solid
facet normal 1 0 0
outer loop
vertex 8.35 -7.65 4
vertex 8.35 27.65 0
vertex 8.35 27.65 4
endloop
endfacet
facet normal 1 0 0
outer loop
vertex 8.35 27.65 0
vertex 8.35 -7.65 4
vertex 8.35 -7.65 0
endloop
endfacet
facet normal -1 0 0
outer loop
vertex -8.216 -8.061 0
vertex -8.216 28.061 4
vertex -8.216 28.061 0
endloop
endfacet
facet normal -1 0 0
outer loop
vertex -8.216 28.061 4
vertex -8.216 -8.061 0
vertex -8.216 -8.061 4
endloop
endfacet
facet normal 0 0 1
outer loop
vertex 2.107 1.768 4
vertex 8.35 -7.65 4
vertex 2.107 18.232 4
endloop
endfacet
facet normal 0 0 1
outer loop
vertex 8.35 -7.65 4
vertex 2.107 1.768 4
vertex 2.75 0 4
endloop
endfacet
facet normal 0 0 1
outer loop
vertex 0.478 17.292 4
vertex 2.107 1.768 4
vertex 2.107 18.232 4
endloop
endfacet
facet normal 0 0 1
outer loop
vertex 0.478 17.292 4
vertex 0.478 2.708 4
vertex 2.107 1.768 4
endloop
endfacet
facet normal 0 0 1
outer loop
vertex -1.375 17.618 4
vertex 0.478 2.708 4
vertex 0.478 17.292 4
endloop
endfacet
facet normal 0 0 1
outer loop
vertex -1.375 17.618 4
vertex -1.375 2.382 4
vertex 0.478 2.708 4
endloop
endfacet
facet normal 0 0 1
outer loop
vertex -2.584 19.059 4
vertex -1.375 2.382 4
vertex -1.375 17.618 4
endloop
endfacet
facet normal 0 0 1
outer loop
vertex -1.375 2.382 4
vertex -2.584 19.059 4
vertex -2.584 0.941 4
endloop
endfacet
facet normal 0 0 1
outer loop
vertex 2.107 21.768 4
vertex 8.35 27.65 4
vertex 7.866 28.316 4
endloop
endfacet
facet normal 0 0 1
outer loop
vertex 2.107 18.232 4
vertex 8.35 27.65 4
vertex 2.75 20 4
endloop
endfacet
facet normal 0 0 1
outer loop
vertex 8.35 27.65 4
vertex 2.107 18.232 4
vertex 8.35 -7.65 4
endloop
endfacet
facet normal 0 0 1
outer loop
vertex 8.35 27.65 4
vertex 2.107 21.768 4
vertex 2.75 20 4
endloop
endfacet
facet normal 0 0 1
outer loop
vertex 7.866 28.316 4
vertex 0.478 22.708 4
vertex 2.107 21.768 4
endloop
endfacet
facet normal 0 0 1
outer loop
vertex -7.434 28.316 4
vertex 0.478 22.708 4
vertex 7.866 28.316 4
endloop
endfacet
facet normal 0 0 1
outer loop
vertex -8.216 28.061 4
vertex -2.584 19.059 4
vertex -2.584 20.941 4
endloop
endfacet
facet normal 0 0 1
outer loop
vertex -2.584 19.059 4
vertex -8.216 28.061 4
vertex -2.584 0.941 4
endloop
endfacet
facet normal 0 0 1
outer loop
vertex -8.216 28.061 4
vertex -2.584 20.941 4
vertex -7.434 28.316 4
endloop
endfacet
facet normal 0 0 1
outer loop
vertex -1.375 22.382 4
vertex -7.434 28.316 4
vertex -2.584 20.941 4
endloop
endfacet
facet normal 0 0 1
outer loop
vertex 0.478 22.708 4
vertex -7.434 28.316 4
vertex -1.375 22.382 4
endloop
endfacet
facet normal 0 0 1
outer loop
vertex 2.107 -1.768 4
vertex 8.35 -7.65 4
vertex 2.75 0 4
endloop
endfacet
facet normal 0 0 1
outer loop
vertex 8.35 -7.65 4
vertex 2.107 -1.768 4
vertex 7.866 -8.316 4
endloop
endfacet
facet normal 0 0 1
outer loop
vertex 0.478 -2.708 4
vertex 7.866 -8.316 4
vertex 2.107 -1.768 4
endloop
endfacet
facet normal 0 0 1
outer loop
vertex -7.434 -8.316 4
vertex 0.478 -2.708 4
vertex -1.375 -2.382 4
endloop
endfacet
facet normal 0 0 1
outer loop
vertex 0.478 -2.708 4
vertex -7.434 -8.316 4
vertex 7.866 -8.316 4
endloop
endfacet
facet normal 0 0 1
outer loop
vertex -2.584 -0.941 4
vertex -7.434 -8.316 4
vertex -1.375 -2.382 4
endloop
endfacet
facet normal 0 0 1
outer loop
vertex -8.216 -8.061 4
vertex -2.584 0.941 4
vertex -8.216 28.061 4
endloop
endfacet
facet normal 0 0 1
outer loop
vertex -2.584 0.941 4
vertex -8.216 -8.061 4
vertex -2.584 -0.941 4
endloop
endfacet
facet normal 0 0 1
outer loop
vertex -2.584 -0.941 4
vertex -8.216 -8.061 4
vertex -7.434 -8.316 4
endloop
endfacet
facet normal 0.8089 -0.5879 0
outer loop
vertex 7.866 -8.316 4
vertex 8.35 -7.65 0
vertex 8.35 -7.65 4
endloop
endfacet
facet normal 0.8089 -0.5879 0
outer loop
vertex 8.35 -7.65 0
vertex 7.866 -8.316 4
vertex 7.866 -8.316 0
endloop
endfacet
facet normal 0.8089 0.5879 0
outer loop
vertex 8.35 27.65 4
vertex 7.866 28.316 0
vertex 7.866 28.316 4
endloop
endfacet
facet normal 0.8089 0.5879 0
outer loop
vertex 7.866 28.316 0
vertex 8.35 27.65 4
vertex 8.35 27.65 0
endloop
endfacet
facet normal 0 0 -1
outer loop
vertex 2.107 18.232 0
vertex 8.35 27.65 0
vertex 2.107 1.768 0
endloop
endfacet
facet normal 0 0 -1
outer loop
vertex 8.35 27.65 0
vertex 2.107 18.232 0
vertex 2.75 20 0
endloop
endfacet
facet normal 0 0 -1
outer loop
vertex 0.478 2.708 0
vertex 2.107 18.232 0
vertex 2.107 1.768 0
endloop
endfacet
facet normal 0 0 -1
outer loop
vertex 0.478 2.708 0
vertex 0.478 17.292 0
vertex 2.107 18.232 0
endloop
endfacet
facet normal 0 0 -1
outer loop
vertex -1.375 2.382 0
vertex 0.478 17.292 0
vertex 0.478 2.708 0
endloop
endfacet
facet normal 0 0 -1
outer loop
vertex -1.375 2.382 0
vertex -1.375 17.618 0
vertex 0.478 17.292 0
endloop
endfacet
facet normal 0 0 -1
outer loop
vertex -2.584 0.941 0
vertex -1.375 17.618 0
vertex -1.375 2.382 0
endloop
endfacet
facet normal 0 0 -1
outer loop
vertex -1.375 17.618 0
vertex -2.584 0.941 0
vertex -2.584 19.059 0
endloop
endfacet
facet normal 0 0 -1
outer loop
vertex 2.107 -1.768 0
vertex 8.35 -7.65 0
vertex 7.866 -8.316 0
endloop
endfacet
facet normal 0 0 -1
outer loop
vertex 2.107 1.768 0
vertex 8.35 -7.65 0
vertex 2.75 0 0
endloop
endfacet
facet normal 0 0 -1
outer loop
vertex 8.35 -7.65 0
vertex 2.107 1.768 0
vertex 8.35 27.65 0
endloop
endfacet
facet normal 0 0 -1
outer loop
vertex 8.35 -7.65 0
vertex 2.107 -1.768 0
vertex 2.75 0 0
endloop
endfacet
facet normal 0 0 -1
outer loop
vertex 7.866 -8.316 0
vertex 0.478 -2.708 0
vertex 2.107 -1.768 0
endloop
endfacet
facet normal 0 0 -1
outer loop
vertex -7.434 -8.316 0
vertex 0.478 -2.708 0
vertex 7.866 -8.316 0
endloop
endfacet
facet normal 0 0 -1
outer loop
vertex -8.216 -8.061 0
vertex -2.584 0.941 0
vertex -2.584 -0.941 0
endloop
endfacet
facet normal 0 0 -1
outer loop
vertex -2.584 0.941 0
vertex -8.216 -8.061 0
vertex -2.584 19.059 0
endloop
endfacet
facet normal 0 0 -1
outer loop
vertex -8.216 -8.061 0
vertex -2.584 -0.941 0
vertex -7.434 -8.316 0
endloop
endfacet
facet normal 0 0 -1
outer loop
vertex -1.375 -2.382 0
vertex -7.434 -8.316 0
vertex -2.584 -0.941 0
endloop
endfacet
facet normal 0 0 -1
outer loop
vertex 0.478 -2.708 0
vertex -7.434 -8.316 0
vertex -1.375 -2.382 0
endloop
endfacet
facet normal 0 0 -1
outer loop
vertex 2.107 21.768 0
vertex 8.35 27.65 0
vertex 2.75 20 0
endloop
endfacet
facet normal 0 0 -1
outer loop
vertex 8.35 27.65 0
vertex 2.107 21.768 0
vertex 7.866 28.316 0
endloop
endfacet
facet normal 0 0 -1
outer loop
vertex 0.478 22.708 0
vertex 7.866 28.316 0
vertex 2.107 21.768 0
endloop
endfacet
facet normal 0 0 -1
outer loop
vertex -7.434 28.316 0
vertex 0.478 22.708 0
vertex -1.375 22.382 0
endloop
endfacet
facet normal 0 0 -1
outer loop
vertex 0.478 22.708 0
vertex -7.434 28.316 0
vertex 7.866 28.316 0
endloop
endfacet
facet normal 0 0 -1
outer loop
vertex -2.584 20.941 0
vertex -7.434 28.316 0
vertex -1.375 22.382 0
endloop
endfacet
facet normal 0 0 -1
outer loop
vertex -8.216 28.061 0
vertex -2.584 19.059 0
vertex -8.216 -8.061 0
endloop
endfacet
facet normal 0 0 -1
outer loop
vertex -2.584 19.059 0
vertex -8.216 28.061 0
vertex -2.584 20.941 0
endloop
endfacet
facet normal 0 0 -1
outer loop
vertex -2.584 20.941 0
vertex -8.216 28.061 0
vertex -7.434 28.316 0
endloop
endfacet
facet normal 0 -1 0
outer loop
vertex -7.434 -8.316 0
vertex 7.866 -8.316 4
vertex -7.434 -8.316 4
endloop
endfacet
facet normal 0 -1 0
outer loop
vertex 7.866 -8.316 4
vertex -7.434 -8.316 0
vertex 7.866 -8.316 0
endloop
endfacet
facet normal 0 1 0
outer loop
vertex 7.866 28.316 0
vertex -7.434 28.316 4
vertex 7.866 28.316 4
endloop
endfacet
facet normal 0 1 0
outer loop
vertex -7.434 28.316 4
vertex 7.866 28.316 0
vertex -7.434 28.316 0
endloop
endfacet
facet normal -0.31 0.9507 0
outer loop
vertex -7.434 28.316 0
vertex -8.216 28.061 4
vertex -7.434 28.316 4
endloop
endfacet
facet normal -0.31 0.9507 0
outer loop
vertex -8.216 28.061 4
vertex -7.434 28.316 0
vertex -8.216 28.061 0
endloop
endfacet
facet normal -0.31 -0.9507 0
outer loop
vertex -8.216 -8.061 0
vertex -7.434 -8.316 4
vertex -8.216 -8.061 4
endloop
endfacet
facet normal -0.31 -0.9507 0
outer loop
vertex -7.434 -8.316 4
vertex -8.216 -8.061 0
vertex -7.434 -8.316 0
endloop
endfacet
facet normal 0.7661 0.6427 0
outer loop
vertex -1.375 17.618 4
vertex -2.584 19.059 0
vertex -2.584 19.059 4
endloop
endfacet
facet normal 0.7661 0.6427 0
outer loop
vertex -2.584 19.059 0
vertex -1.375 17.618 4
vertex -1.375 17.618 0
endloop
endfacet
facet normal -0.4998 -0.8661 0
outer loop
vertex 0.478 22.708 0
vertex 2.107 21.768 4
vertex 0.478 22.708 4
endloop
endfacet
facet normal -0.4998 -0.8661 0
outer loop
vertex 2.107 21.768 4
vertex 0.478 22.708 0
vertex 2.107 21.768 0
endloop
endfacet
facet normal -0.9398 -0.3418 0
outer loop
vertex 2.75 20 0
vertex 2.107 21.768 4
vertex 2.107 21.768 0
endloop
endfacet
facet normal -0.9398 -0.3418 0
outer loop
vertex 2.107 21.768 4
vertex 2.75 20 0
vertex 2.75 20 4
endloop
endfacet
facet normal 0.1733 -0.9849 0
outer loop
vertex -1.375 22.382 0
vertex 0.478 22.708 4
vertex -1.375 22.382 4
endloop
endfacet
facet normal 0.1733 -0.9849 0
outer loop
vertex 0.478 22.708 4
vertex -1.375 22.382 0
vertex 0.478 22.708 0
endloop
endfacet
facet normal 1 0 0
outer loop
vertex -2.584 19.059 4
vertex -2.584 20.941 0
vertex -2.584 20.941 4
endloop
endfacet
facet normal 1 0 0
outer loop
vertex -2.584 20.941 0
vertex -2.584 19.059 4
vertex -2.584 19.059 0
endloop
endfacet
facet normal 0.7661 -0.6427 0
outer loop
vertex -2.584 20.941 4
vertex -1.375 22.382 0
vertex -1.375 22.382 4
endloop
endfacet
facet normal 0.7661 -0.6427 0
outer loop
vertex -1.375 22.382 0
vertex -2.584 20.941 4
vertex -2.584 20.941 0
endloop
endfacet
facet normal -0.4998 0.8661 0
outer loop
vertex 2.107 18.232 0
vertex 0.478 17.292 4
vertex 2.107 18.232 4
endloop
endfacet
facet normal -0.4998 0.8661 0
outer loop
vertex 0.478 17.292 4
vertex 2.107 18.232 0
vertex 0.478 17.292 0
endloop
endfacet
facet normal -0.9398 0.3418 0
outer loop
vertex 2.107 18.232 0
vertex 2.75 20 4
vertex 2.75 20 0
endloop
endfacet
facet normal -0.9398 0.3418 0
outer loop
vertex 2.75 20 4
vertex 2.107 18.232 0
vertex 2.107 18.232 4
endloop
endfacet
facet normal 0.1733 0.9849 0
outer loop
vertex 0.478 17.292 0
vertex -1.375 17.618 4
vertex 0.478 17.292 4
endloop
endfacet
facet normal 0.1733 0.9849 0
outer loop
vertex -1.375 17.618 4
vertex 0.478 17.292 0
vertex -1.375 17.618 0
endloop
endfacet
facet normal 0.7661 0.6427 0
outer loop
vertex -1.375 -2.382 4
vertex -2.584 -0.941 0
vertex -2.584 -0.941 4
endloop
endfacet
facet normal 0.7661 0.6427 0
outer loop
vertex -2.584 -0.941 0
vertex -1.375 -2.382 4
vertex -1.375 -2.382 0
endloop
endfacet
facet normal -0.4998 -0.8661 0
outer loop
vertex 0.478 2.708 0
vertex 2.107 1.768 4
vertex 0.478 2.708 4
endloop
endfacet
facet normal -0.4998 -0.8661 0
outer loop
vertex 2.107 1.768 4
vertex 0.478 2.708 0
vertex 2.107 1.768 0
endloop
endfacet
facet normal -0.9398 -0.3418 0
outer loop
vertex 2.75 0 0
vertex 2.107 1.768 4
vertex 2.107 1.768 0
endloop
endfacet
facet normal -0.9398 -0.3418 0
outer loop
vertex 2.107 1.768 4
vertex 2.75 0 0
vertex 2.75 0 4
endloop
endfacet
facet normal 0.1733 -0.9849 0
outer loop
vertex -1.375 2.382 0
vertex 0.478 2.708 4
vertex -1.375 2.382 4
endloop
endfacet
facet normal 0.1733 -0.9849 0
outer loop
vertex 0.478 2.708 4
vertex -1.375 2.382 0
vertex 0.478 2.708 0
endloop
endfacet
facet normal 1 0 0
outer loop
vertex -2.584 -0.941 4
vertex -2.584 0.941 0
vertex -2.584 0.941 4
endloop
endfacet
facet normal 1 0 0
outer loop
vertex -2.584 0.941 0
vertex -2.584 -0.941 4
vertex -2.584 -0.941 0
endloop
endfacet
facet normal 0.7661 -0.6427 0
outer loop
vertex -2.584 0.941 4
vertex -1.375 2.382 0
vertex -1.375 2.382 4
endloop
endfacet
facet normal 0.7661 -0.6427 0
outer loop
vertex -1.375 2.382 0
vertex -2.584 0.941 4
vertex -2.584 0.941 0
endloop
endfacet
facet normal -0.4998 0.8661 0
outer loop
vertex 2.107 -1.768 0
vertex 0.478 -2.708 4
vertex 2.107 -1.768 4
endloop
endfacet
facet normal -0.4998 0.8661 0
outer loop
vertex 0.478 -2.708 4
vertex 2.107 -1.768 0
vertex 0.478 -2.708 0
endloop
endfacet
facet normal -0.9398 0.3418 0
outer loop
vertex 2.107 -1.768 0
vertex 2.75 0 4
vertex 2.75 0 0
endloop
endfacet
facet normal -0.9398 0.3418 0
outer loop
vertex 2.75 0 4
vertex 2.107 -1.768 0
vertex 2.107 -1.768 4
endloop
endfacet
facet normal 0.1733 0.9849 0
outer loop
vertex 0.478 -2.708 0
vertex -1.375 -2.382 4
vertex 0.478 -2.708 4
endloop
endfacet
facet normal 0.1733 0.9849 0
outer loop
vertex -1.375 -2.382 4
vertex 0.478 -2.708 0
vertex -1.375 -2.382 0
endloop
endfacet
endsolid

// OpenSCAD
// rob@openpart.co.uk 20140202-02:02
// 2 hole joining plate for 20mm NOMINAL extrusion
// V-Slot & others

module roundedRect(size, radius)
{
	x = size[0];
	y = size[1];
	z = size[2];
	linear_extrude(height=z)
	hull()
	{
		// place 4 circles in the corners, with the given radius
		translate([(-x/2)+(radius/2), (-y/2)+(radius/2), 0])
		circle(r=radius);
		translate([(x/2)-(radius/2), (-y/2)+(radius/2), 0])
		circle(r=radius);
		translate([(-x/2)+(radius/2), (y/2)-(radius/2), 0])
		circle(r=radius);
		translate([(x/2)-(radius/2), (y/2)-(radius/2), 0])
		circle(r=radius);
	}
}

hole = 5.5 / 2;
plate_width = 36;
plate_length = 16;
plate_thickness = 4;
extend_past_thickness = 2;
corner_radius = 0.7;

difference() {
	translate([0, 10, 0])
		roundedRect ([plate_length, plate_width, plate_thickness], corner_radius);
	
	// Holes
	translate([0,20,-1])
		cylinder(h = (extend_past_thickness+plate_thickness+2), r = hole);
	translate([0,0,-1])
		cylinder(h = (extend_past_thickness+plate_thickness+2), r = hole);
}
